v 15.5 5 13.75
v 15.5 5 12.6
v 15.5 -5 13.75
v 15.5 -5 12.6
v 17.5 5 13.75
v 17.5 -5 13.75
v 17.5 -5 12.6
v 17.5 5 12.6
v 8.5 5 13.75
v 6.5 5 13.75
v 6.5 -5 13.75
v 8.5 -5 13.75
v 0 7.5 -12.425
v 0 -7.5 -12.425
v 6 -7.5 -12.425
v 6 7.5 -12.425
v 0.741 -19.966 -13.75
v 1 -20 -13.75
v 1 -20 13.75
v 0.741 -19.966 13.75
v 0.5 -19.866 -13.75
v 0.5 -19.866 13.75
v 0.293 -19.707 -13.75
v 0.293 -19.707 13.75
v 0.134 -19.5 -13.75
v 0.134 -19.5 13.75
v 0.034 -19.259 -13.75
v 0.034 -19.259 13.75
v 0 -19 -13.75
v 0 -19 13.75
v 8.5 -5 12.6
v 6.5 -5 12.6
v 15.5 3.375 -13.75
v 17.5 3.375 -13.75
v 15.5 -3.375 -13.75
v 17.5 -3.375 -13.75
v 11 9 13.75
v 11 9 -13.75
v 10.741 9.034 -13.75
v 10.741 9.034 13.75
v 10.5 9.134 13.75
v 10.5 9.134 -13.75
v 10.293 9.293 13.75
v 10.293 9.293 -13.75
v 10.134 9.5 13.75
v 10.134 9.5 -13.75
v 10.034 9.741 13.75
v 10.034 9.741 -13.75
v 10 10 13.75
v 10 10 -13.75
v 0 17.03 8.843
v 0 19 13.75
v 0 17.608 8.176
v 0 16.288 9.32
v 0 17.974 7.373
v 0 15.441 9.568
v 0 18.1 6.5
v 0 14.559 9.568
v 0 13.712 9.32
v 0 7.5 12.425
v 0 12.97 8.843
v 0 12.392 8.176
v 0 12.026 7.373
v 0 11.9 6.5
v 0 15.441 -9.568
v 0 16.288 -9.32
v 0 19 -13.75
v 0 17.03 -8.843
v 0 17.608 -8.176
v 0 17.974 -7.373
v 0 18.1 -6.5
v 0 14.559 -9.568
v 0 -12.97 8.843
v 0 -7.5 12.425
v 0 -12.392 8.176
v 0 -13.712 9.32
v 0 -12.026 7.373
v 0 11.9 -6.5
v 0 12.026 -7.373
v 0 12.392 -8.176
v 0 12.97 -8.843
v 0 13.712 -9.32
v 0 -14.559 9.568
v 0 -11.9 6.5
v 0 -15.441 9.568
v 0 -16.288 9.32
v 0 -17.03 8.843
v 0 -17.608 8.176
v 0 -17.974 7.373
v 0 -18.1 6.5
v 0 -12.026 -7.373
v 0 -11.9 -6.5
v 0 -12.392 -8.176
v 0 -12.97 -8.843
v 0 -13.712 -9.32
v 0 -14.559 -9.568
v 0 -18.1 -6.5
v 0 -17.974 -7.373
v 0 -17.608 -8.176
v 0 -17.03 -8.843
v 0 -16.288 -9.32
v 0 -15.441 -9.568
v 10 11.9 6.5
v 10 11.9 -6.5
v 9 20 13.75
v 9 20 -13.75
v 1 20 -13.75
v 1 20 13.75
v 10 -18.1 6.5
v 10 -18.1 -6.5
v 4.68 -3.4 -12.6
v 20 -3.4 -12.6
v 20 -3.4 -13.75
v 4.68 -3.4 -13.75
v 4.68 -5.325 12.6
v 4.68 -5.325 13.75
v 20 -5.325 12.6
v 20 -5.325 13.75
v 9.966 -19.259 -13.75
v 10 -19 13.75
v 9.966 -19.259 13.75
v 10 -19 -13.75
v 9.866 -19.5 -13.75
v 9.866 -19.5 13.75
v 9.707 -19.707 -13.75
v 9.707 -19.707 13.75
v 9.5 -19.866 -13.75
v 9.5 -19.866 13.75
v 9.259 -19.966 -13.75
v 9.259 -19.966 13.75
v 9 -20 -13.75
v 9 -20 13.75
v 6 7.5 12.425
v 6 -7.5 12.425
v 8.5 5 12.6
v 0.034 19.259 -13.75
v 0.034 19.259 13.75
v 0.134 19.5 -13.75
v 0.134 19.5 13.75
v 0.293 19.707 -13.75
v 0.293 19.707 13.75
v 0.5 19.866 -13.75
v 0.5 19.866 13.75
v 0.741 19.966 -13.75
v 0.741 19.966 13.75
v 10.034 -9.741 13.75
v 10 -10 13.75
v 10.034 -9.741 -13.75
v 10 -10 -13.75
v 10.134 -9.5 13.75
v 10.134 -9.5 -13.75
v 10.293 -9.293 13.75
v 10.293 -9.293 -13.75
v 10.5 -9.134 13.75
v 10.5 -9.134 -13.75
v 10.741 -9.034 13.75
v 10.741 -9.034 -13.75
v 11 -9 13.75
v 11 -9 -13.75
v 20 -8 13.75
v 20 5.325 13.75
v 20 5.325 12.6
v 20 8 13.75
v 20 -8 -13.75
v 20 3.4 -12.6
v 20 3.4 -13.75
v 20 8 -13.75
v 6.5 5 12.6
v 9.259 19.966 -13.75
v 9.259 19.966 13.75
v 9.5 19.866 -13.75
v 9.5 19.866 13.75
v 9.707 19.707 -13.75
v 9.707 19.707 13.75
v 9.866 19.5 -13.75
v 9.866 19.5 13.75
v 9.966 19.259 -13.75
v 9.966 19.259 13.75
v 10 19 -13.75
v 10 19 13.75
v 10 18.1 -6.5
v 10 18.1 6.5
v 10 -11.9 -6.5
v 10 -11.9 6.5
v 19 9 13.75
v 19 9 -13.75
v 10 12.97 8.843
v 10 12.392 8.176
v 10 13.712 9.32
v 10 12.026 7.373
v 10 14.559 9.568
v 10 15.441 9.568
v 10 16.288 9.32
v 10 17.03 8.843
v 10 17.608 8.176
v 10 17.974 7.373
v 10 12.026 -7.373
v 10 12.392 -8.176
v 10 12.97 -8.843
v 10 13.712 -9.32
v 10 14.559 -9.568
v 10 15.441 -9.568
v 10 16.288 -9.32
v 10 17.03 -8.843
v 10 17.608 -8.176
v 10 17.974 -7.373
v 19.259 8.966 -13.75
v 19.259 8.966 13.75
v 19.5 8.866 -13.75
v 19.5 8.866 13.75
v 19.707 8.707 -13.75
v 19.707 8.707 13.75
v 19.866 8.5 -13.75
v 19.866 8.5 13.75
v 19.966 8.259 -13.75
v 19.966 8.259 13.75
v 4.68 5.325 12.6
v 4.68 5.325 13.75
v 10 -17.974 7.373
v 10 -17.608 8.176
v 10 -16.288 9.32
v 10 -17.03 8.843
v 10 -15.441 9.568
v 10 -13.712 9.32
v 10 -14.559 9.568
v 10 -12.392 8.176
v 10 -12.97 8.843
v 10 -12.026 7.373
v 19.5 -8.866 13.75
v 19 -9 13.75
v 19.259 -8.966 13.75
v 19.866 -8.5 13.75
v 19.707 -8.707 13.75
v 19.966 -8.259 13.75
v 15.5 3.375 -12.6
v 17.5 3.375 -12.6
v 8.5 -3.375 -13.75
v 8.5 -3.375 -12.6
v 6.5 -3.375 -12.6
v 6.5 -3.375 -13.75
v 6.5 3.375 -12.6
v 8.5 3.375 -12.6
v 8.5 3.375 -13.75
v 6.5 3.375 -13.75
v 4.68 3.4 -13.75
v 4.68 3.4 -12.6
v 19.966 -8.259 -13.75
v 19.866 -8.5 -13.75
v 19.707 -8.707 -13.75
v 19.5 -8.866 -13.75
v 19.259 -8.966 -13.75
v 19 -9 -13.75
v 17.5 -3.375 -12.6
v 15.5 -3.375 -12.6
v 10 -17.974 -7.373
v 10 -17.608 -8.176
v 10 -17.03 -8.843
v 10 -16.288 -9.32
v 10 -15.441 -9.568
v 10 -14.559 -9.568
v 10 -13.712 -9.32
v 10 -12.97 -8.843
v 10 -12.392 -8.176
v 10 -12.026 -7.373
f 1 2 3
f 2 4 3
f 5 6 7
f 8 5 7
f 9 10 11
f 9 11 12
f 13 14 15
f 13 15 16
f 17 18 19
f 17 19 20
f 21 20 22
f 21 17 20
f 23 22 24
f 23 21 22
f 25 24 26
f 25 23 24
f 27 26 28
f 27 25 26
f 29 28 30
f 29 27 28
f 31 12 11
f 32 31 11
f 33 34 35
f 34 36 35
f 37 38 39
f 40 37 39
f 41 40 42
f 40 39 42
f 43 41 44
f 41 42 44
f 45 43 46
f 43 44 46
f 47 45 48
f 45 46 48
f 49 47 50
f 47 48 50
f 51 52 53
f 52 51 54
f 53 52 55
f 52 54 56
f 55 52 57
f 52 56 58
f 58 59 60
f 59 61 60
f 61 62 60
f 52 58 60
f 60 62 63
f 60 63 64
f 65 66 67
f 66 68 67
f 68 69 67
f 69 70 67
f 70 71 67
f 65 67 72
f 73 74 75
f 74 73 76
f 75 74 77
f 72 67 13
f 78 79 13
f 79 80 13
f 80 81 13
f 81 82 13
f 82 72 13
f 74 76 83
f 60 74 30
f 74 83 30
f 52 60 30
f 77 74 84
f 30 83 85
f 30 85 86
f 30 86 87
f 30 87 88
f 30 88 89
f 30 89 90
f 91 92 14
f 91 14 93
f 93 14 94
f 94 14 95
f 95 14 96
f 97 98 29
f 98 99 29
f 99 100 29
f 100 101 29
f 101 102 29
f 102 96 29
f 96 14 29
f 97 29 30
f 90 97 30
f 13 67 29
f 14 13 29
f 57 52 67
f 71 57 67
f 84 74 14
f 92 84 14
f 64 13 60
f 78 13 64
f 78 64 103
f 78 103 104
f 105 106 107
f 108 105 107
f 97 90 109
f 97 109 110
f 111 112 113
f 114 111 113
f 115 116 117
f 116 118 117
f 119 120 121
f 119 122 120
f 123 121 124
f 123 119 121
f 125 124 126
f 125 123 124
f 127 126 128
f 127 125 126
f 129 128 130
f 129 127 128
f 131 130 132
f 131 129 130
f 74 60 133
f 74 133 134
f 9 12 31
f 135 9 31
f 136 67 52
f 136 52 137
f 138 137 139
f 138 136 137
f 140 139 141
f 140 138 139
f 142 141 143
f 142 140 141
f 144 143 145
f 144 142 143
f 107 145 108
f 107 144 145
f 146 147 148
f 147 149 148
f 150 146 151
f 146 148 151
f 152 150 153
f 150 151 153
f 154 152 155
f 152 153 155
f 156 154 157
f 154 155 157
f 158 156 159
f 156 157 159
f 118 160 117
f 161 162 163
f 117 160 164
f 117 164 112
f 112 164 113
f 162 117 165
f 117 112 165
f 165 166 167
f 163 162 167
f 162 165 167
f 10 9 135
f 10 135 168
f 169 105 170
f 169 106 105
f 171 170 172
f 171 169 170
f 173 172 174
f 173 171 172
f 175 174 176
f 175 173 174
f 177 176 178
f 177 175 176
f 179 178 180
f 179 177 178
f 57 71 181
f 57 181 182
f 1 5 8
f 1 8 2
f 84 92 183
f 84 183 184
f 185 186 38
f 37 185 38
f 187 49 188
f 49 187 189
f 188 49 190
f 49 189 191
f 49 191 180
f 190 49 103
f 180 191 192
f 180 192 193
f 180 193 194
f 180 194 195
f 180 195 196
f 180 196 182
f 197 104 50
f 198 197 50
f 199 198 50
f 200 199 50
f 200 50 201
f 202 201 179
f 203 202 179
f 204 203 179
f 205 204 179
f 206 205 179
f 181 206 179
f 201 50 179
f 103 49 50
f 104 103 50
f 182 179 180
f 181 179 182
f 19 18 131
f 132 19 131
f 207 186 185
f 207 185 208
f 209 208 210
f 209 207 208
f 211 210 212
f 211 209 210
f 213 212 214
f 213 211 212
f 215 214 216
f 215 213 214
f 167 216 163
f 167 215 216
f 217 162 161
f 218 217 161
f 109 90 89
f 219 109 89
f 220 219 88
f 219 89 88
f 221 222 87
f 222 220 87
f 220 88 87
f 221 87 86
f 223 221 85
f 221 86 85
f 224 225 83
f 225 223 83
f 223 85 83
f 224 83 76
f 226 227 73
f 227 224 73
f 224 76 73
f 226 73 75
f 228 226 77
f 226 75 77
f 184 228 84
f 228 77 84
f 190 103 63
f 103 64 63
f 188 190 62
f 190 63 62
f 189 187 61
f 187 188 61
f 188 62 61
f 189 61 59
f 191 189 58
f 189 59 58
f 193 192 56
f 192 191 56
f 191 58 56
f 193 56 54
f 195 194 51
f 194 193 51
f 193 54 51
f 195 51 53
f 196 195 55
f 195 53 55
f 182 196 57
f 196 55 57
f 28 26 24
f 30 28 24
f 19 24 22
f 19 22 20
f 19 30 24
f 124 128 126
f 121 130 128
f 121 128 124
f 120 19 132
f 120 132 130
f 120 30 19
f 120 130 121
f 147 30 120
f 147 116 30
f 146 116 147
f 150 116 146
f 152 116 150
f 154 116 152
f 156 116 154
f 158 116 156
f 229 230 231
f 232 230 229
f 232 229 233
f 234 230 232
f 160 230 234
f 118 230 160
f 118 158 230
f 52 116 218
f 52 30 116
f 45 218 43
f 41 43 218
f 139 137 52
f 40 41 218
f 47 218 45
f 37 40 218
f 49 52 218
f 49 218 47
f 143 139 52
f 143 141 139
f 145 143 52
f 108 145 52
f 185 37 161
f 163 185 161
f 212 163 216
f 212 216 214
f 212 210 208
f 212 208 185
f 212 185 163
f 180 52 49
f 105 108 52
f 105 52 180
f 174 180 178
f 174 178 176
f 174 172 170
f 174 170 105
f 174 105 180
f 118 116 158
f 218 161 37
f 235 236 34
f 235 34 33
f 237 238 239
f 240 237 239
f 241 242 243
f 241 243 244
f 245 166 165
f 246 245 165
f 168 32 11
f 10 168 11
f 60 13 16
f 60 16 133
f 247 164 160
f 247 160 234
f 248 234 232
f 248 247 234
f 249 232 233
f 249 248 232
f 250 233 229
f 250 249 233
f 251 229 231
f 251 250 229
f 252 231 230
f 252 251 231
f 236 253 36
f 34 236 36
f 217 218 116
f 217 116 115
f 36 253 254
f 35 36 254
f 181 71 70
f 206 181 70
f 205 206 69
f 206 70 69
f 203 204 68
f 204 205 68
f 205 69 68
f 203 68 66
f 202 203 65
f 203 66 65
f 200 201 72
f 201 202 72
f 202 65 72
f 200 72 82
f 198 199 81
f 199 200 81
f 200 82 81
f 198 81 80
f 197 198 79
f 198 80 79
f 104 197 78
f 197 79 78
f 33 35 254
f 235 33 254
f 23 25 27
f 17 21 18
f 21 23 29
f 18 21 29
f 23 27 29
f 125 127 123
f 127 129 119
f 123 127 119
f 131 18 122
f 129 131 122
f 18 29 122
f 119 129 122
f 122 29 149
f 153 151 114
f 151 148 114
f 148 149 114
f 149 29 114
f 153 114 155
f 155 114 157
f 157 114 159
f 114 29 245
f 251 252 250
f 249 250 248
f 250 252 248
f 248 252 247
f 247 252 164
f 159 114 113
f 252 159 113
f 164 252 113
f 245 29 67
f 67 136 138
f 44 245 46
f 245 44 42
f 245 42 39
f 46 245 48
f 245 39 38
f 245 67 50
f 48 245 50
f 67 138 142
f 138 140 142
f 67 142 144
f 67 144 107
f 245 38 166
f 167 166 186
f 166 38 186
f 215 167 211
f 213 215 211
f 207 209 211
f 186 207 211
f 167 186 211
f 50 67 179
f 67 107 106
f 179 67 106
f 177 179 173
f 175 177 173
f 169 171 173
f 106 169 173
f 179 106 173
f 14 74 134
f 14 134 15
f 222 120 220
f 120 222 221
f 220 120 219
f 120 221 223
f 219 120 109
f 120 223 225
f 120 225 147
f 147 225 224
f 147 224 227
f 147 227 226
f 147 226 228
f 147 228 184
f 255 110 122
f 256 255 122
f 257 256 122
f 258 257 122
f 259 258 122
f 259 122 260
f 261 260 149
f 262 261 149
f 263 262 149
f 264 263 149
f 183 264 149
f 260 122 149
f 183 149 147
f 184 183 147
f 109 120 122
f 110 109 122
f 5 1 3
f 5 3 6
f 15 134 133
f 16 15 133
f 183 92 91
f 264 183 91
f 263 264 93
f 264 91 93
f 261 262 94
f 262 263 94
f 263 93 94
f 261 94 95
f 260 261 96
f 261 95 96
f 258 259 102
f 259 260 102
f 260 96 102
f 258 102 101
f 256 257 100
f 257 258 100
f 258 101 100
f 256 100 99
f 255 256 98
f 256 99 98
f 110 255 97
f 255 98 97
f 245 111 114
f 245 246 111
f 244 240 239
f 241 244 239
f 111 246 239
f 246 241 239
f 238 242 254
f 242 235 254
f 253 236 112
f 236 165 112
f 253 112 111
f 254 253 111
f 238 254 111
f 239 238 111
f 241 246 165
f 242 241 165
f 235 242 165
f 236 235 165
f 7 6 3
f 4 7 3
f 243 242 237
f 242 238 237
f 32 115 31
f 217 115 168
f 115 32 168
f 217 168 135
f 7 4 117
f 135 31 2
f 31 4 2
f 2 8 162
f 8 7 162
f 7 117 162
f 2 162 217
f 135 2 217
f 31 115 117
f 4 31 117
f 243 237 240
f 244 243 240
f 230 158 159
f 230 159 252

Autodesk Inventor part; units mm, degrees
sketch "Skizze_1" plane through (0, 0, 0) normal (0, 0, 1) x (1, 0, 0)
  line L0 (0, 19) -> (0, -19)
  arc A0 (0, -19) -> (1, -20) centre (1, -19) ccw
  line L1 (1, -20) -> (9, -20)
  arc A1 (9, -20) -> (10, -19) centre (9, -19) ccw
  line L2 (10, -19) -> (10, -10)
  arc A2 (11, -9) -> (10, -10) centre (11, -10) ccw
  line L3 (11, -9) -> (19, -9)
  arc A3 (19, -9) -> (20, -8) centre (19, -8) ccw
  line L4 (20, -8) -> (20, 8)
  arc A4 (20, 8) -> (19, 9) centre (19, 8) ccw
  line L5 (19, 9) -> (11, 9)
  arc A5 (10, 10) -> (11, 9) centre (11, 10) ccw
  line L6 (10, 10) -> (10, 19)
  arc A6 (10, 19) -> (9, 20) centre (9, 19) ccw
  line L7 (9, 20) -> (1, 20)
  arc A7 (1, 20) -> (0, 19) centre (1, 19) ccw
extrude "Extrusion1" add sketch "Skizze_1" along normal mid plane 27.5
sketch "Skizze_2" plane through (0, 0, 0) normal (1, 0, 0) x (0, 1, 0)
  arc A0 (18.1, 6.5) -> (11.9, 6.5) centre (15, 6.5) ccw
  line L0 (11.9, 6.5) -> (11.9, -6.5)
  arc A1 (11.9, -6.5) -> (18.1, -6.5) centre (15, -6.5) ccw
  line L1 (18.1, -6.5) -> (18.1, 6.5)
extrude "Extrusion2" cut sketch "Skizze_2" along normal blind 10
sketch "Skizze_3" plane through (0, 0, 0) normal (1, 0, 0) x (0, 1, 0)
  arc A0 (-11.9, 6.5) -> (-18.1, 6.5) centre (-15, 6.5) ccw
  line L0 (-18.1, 6.5) -> (-18.1, -6.5)
  arc A1 (-18.1, -6.5) -> (-11.9, -6.5) centre (-15, -6.5) ccw
  line L1 (-11.9, -6.5) -> (-11.9, 6.5)
extrude "Extrusion3" cut sketch "Skizze_3" along normal blind 10
sketch "Skizze_4" plane through (20, 0, 0) normal (1, 0, 0) x (0, 0, -1)
  line L0 (-13.75, 5.325) -> (-13.75, -5.325)
  line L1 (-13.75, -5.325) -> (-12.6, -5.325)
  line L2 (-12.6, -5.325) -> (-12.6, 5.325)
  line L3 (-12.6, 5.325) -> (-13.75, 5.325)
extrude "Extrusion4" cut sketch "Skizze_4" against normal blind 15.32
sketch "Skizze_5" plane through (20, 0, 0) normal (1, 0, 0) x (0, 0, -1)
  line L0 (12.6, 3.4) -> (12.6, -3.4)
  line L1 (12.6, -3.4) -> (13.75, -3.4)
  line L2 (13.75, -3.4) -> (13.75, 3.4)
  line L3 (13.75, 3.4) -> (12.6, 3.4)
extrude "Extrusion5" cut sketch "Skizze_5" against normal blind 15.32
sketch "Skizze_6" plane through (0, 0, 0) normal (0, 1, 0) x (-1, 0, 0)
  line L0 (-6.5, 8.75) -> (-6.5, 13.75)
  line L1 (-6.5, 13.75) -> (-8.5, 13.75)
  line L2 (-8.5, 13.75) -> (-8.5, 11.75)
  line L3 (-8.5, 11.75) -> (-15.5, 11.75)
  line L4 (-15.5, 11.75) -> (-15.5, 13.75)
  line L5 (-15.5, 13.75) -> (-17.5, 13.75)
  line L6 (-17.5, 13.75) -> (-17.5, 8.75)
  line L7 (-17.5, 8.75) -> (-6.5, 8.75)
extrude "Extrusion6" add sketch "Skizze_6" along normal mid plane 10
sketch "Skizze_7" plane through (0, 0, 0) normal (0, 1, 0) x (-1, 0, 0)
  line L0 (-6.5, -8.75) -> (-17.5, -8.75)
  line L1 (-17.5, -8.75) -> (-17.5, -13.75)
  line L2 (-17.5, -13.75) -> (-15.5, -13.75)
  line L3 (-15.5, -13.75) -> (-15.5, -11.75)
  line L4 (-15.5, -11.75) -> (-8.5, -11.75)
  line L5 (-8.5, -11.75) -> (-8.5, -13.75)
  line L6 (-8.5, -13.75) -> (-6.5, -13.75)
  line L7 (-6.5, -13.75) -> (-6.5, -8.75)
extrude "Extrusion7" add sketch "Skizze_7" along normal mid plane 6.75
sketch "Skizze_8" plane through (0, 0, 0) normal (1, 0, 0) x (0, 1, 0)
  line L0 (7.5, 12.425) -> (-7.5, 12.425)
  line L1 (-7.5, 12.425) -> (-7.5, -12.425)
  line L2 (-7.5, -12.425) -> (7.5, -12.425)
  line L3 (7.5, -12.425) -> (7.5, 12.425)
extrude "Extrusion8" cut sketch "Skizze_8" along normal blind 6
ref_plane "side_1_XY" through (0, 0, 0) normal (-1, 0, 0) x (0, 0, -1)
ref_plane "side_1_YZ" through (0, 0, 0) normal (0, 0, -1) x (0, -1, 0)
ref_plane "side_1_ZX" through (0, 0, 0) normal (0, -1, 0) x (-1, 0, 0)
properties part number "May Tec 1.65.2101_Magnetic lock PA 0"
